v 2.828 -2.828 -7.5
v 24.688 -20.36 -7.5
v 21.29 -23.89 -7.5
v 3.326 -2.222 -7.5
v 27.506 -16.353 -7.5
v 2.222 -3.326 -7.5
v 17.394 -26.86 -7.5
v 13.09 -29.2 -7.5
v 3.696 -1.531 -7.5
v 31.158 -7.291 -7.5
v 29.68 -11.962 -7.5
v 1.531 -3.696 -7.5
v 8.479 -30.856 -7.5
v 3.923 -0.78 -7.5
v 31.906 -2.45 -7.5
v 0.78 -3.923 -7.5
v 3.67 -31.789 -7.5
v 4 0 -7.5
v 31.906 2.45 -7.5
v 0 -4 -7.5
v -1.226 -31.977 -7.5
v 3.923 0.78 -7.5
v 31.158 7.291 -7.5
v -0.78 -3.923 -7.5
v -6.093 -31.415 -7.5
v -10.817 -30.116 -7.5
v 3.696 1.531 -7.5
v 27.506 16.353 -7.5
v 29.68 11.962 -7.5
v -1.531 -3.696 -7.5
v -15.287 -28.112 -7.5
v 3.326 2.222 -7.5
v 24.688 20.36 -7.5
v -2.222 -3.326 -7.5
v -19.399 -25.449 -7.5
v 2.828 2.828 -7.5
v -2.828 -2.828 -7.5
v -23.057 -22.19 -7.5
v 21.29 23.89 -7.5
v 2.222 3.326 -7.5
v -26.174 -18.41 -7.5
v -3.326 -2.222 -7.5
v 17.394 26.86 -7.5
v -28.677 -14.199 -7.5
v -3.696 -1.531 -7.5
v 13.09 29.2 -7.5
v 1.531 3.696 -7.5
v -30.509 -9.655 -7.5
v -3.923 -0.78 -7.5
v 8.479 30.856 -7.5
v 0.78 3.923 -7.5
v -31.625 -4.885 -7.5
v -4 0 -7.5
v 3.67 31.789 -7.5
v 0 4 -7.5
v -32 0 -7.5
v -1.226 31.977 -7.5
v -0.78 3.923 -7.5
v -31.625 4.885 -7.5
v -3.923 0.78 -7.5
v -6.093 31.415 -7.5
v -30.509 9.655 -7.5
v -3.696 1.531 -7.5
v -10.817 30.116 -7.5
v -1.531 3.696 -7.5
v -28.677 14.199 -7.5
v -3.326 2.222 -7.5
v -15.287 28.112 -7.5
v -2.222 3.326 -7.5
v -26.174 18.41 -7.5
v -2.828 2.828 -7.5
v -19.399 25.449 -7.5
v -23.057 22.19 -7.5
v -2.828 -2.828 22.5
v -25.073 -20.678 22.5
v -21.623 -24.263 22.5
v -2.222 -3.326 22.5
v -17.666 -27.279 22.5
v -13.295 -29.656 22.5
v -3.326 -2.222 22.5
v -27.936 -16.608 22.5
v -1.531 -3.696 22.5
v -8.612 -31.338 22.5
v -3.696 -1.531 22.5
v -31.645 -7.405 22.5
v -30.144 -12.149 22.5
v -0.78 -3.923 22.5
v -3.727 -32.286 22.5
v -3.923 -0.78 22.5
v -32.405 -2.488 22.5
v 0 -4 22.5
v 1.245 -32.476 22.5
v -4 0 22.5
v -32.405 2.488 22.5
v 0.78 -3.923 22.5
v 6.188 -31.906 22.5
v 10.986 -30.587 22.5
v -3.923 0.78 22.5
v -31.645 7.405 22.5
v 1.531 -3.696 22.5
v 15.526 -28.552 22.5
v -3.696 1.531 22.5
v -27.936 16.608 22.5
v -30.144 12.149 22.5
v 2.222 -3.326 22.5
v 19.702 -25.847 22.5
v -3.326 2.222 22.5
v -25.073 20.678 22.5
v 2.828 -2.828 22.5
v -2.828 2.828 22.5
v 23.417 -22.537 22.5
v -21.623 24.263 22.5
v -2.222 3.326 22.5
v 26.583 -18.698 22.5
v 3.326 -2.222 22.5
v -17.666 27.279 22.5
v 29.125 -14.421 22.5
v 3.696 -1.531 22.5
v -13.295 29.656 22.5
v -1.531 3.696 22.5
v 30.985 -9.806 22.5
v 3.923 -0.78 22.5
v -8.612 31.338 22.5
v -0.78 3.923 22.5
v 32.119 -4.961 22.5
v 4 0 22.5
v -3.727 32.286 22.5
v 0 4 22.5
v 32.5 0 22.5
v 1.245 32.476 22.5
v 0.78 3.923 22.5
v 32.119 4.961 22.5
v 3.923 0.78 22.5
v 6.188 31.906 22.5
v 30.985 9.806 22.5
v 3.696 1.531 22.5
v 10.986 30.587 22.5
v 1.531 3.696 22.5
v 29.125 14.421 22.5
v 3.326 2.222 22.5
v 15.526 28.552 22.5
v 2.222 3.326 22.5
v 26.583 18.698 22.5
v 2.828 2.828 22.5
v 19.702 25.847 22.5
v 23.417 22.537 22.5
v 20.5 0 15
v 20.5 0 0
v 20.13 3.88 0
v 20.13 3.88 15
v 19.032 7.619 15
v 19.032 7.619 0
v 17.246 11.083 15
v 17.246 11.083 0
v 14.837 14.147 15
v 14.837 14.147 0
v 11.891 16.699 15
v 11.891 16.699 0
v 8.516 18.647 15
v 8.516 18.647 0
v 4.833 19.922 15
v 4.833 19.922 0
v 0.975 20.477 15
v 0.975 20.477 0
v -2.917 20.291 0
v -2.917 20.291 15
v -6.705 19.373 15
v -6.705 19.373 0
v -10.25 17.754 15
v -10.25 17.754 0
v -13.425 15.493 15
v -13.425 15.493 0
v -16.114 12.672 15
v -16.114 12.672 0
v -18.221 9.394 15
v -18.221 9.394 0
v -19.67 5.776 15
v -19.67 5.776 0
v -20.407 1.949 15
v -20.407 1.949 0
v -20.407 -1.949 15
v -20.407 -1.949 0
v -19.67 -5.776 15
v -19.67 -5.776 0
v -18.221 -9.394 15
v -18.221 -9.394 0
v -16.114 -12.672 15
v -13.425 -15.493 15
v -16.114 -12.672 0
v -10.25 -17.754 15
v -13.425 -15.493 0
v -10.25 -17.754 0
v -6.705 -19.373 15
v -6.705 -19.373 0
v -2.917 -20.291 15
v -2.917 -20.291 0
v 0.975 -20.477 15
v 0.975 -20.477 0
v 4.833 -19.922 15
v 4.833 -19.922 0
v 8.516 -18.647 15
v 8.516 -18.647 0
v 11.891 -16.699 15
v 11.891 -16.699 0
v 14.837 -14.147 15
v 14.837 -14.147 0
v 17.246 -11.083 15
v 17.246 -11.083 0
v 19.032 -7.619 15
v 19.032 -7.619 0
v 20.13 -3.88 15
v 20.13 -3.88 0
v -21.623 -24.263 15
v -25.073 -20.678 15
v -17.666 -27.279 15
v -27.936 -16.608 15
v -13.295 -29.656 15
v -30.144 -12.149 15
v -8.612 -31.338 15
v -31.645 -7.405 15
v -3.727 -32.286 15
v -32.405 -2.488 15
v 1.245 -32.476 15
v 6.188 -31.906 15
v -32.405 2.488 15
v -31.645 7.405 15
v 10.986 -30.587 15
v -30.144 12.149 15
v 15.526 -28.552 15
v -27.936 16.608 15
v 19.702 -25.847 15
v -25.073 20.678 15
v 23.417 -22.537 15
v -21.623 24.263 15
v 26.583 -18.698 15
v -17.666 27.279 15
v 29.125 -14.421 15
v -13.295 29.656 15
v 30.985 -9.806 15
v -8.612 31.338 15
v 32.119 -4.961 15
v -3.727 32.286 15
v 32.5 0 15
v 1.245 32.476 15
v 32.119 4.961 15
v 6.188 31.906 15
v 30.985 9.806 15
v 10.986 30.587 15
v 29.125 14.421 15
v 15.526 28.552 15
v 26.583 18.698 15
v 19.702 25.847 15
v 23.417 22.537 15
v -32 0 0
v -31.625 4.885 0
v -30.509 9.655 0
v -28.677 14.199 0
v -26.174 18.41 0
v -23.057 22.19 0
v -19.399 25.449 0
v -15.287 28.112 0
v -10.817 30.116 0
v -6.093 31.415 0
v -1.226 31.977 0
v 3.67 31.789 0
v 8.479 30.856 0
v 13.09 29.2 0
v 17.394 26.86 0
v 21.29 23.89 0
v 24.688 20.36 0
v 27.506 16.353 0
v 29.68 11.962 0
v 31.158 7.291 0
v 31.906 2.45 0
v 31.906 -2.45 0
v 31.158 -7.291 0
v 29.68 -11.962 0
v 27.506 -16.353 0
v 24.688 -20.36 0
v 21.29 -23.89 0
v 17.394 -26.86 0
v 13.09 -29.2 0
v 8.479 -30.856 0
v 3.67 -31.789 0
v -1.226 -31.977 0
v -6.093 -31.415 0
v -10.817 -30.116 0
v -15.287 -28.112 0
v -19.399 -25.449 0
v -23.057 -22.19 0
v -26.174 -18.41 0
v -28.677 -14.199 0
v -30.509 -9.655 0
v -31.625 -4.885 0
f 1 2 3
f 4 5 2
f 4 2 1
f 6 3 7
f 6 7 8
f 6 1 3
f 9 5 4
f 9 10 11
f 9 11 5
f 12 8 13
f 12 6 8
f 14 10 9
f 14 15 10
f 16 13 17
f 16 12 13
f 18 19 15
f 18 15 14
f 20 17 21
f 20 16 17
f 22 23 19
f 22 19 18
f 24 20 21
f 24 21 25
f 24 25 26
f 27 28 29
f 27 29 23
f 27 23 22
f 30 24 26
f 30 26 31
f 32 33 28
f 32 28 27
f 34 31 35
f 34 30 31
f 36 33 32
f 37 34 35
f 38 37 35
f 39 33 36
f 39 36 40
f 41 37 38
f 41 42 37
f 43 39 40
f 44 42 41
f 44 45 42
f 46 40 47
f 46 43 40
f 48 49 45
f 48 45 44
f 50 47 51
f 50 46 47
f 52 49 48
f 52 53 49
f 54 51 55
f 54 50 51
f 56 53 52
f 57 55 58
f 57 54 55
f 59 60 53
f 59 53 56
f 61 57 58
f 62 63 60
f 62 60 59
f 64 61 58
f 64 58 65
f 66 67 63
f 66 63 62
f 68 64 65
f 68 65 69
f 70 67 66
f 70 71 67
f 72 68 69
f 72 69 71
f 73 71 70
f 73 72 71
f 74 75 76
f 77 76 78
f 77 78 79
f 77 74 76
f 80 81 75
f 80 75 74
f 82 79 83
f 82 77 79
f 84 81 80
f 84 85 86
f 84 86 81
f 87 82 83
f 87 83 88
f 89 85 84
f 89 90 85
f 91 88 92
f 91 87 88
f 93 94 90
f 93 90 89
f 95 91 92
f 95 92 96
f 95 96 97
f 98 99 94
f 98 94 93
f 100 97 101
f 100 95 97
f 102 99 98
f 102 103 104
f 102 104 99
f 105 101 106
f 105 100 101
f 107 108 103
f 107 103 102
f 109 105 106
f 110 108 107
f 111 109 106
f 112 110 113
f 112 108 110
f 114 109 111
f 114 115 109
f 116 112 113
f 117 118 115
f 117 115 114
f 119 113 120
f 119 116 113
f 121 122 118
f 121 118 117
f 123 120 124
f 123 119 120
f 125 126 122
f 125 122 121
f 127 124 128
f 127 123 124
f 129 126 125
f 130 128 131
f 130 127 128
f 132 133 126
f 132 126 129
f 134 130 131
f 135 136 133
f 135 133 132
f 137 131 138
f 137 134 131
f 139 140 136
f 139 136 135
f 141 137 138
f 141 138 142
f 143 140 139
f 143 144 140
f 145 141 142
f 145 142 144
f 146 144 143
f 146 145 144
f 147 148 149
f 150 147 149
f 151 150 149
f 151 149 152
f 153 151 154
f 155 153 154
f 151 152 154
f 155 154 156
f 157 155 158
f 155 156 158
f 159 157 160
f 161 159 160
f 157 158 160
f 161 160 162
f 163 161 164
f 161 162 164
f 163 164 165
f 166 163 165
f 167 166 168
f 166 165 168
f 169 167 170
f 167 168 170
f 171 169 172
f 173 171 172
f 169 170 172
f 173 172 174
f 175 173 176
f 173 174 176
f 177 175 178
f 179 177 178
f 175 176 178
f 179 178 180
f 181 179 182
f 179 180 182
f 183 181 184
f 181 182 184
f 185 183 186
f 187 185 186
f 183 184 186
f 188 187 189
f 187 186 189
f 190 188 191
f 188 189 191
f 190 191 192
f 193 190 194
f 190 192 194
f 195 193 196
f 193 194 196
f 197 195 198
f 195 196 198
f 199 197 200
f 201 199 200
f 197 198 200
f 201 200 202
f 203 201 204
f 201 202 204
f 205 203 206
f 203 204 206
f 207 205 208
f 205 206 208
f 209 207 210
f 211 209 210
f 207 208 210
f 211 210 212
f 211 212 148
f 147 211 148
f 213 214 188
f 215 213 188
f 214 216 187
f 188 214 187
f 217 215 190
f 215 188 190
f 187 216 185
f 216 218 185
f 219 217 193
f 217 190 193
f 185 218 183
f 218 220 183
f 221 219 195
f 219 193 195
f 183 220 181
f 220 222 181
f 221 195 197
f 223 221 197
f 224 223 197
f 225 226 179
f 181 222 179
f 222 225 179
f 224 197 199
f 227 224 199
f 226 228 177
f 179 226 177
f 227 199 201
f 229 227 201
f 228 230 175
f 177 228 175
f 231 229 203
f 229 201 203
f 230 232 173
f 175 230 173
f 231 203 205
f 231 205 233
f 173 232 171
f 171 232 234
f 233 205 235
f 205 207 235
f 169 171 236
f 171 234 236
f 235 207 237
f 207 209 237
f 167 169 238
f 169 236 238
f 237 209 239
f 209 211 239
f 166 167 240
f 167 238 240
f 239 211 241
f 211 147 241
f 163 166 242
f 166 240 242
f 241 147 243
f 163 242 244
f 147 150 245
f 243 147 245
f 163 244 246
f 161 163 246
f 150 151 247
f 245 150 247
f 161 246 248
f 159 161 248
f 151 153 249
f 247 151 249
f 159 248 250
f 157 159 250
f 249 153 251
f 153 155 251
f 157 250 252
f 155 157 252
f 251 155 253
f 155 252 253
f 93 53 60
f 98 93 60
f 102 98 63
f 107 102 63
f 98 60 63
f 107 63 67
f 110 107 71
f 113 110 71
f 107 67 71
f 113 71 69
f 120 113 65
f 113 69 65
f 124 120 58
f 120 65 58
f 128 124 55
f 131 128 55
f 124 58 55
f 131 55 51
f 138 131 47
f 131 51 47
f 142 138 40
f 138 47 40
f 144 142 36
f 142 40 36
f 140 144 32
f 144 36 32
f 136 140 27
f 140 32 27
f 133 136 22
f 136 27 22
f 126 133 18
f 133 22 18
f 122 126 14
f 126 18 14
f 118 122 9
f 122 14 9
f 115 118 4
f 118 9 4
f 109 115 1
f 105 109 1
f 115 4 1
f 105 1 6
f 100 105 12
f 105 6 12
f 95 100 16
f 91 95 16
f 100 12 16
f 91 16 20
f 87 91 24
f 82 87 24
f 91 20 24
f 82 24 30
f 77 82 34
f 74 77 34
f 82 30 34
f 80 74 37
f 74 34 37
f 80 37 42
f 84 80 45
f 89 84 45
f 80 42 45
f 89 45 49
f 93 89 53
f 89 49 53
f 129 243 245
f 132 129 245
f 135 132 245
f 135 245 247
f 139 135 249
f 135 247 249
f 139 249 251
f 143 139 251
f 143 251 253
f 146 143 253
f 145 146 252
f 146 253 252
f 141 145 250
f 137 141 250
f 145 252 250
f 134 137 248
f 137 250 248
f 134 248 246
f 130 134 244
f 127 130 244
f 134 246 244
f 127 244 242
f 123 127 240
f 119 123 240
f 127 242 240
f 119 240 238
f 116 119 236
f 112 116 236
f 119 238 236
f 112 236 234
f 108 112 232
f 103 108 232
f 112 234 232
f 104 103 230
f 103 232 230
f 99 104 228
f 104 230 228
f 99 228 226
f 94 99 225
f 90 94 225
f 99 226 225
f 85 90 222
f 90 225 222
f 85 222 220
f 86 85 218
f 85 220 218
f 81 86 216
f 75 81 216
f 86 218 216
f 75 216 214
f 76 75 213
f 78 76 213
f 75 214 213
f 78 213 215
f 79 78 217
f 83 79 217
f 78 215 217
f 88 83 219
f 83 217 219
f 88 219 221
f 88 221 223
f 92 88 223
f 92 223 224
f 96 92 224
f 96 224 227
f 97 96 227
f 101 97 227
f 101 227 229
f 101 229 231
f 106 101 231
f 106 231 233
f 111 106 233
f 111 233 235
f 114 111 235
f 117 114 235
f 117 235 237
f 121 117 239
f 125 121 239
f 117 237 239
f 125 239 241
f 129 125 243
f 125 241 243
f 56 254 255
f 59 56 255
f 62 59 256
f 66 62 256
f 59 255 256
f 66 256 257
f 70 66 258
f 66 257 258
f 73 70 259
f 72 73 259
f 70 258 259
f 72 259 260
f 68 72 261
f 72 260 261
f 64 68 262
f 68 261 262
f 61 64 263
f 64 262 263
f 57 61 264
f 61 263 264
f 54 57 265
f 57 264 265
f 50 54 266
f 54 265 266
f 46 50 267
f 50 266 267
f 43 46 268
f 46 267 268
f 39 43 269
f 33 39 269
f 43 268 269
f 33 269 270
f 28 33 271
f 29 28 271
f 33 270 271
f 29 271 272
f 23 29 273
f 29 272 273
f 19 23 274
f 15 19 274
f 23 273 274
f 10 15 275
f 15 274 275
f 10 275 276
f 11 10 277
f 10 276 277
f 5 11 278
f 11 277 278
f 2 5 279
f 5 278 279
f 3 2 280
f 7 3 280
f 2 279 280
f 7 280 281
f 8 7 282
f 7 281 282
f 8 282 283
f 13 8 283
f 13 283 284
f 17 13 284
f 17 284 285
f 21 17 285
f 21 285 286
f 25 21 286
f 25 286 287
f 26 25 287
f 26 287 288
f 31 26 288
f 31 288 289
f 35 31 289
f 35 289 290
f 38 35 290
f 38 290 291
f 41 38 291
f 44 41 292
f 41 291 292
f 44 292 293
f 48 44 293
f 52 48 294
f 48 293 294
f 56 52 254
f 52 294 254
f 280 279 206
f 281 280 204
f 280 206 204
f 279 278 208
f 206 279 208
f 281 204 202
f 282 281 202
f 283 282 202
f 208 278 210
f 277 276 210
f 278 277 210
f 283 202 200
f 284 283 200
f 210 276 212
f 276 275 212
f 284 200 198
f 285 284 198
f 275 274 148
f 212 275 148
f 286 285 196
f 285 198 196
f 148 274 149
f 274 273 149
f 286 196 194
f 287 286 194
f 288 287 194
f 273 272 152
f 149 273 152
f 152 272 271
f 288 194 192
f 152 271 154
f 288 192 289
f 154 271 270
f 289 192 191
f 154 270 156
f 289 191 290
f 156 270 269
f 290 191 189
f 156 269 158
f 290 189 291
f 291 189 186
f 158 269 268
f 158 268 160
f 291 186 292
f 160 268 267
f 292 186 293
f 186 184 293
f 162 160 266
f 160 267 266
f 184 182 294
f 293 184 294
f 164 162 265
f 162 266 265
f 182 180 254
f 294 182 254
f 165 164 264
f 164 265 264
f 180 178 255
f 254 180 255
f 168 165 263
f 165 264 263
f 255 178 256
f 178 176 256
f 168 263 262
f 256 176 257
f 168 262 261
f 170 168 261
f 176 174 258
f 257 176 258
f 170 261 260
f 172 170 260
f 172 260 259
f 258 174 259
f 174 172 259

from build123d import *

# Parameters (mm, degrees)
SKETCH1_R           = 20.5
BOSS_EXTRUDE1_DEPTH = 15
SKETCH2_R           = 32.5
BOSS_EXTRUDE2_DEPTH = 7.5
SKETCH3_R           = 32
BOSS_EXTRUDE3_DEPTH = 7.5
SKETCH4_R           = 4
CUT_EXTRUDE1_DEPTH  = 30


with BuildPart() as part:
    # Sketch1 → Boss-Extrude1 (new body)
    with BuildSketch(Plane.XY):
        Circle(SKETCH1_R)
    extrude(amount=BOSS_EXTRUDE1_DEPTH)

    # Sketch2 → Boss-Extrude2 (add)
    with BuildSketch(Plane.XY.offset(15)):
        Circle(SKETCH2_R)
    extrude(amount=BOSS_EXTRUDE2_DEPTH)

    # Sketch3 → Boss-Extrude3 (add)
    with BuildSketch(Plane(origin=(0, 0, 0), x_dir=(-1, 0, 0), z_dir=(0, 0, -1))):
        Circle(SKETCH3_R)
    extrude(amount=BOSS_EXTRUDE3_DEPTH)

    # Sketch4 → Cut-Extrude1 (cut)
    with BuildSketch(Plane(origin=(0, 0, -7.5), x_dir=(-1, 0, 0), z_dir=(0, 0, -1))):
        Circle(SKETCH4_R)
    extrude(amount=-CUT_EXTRUDE1_DEPTH, mode=Mode.SUBTRACT)


solid = part.part
